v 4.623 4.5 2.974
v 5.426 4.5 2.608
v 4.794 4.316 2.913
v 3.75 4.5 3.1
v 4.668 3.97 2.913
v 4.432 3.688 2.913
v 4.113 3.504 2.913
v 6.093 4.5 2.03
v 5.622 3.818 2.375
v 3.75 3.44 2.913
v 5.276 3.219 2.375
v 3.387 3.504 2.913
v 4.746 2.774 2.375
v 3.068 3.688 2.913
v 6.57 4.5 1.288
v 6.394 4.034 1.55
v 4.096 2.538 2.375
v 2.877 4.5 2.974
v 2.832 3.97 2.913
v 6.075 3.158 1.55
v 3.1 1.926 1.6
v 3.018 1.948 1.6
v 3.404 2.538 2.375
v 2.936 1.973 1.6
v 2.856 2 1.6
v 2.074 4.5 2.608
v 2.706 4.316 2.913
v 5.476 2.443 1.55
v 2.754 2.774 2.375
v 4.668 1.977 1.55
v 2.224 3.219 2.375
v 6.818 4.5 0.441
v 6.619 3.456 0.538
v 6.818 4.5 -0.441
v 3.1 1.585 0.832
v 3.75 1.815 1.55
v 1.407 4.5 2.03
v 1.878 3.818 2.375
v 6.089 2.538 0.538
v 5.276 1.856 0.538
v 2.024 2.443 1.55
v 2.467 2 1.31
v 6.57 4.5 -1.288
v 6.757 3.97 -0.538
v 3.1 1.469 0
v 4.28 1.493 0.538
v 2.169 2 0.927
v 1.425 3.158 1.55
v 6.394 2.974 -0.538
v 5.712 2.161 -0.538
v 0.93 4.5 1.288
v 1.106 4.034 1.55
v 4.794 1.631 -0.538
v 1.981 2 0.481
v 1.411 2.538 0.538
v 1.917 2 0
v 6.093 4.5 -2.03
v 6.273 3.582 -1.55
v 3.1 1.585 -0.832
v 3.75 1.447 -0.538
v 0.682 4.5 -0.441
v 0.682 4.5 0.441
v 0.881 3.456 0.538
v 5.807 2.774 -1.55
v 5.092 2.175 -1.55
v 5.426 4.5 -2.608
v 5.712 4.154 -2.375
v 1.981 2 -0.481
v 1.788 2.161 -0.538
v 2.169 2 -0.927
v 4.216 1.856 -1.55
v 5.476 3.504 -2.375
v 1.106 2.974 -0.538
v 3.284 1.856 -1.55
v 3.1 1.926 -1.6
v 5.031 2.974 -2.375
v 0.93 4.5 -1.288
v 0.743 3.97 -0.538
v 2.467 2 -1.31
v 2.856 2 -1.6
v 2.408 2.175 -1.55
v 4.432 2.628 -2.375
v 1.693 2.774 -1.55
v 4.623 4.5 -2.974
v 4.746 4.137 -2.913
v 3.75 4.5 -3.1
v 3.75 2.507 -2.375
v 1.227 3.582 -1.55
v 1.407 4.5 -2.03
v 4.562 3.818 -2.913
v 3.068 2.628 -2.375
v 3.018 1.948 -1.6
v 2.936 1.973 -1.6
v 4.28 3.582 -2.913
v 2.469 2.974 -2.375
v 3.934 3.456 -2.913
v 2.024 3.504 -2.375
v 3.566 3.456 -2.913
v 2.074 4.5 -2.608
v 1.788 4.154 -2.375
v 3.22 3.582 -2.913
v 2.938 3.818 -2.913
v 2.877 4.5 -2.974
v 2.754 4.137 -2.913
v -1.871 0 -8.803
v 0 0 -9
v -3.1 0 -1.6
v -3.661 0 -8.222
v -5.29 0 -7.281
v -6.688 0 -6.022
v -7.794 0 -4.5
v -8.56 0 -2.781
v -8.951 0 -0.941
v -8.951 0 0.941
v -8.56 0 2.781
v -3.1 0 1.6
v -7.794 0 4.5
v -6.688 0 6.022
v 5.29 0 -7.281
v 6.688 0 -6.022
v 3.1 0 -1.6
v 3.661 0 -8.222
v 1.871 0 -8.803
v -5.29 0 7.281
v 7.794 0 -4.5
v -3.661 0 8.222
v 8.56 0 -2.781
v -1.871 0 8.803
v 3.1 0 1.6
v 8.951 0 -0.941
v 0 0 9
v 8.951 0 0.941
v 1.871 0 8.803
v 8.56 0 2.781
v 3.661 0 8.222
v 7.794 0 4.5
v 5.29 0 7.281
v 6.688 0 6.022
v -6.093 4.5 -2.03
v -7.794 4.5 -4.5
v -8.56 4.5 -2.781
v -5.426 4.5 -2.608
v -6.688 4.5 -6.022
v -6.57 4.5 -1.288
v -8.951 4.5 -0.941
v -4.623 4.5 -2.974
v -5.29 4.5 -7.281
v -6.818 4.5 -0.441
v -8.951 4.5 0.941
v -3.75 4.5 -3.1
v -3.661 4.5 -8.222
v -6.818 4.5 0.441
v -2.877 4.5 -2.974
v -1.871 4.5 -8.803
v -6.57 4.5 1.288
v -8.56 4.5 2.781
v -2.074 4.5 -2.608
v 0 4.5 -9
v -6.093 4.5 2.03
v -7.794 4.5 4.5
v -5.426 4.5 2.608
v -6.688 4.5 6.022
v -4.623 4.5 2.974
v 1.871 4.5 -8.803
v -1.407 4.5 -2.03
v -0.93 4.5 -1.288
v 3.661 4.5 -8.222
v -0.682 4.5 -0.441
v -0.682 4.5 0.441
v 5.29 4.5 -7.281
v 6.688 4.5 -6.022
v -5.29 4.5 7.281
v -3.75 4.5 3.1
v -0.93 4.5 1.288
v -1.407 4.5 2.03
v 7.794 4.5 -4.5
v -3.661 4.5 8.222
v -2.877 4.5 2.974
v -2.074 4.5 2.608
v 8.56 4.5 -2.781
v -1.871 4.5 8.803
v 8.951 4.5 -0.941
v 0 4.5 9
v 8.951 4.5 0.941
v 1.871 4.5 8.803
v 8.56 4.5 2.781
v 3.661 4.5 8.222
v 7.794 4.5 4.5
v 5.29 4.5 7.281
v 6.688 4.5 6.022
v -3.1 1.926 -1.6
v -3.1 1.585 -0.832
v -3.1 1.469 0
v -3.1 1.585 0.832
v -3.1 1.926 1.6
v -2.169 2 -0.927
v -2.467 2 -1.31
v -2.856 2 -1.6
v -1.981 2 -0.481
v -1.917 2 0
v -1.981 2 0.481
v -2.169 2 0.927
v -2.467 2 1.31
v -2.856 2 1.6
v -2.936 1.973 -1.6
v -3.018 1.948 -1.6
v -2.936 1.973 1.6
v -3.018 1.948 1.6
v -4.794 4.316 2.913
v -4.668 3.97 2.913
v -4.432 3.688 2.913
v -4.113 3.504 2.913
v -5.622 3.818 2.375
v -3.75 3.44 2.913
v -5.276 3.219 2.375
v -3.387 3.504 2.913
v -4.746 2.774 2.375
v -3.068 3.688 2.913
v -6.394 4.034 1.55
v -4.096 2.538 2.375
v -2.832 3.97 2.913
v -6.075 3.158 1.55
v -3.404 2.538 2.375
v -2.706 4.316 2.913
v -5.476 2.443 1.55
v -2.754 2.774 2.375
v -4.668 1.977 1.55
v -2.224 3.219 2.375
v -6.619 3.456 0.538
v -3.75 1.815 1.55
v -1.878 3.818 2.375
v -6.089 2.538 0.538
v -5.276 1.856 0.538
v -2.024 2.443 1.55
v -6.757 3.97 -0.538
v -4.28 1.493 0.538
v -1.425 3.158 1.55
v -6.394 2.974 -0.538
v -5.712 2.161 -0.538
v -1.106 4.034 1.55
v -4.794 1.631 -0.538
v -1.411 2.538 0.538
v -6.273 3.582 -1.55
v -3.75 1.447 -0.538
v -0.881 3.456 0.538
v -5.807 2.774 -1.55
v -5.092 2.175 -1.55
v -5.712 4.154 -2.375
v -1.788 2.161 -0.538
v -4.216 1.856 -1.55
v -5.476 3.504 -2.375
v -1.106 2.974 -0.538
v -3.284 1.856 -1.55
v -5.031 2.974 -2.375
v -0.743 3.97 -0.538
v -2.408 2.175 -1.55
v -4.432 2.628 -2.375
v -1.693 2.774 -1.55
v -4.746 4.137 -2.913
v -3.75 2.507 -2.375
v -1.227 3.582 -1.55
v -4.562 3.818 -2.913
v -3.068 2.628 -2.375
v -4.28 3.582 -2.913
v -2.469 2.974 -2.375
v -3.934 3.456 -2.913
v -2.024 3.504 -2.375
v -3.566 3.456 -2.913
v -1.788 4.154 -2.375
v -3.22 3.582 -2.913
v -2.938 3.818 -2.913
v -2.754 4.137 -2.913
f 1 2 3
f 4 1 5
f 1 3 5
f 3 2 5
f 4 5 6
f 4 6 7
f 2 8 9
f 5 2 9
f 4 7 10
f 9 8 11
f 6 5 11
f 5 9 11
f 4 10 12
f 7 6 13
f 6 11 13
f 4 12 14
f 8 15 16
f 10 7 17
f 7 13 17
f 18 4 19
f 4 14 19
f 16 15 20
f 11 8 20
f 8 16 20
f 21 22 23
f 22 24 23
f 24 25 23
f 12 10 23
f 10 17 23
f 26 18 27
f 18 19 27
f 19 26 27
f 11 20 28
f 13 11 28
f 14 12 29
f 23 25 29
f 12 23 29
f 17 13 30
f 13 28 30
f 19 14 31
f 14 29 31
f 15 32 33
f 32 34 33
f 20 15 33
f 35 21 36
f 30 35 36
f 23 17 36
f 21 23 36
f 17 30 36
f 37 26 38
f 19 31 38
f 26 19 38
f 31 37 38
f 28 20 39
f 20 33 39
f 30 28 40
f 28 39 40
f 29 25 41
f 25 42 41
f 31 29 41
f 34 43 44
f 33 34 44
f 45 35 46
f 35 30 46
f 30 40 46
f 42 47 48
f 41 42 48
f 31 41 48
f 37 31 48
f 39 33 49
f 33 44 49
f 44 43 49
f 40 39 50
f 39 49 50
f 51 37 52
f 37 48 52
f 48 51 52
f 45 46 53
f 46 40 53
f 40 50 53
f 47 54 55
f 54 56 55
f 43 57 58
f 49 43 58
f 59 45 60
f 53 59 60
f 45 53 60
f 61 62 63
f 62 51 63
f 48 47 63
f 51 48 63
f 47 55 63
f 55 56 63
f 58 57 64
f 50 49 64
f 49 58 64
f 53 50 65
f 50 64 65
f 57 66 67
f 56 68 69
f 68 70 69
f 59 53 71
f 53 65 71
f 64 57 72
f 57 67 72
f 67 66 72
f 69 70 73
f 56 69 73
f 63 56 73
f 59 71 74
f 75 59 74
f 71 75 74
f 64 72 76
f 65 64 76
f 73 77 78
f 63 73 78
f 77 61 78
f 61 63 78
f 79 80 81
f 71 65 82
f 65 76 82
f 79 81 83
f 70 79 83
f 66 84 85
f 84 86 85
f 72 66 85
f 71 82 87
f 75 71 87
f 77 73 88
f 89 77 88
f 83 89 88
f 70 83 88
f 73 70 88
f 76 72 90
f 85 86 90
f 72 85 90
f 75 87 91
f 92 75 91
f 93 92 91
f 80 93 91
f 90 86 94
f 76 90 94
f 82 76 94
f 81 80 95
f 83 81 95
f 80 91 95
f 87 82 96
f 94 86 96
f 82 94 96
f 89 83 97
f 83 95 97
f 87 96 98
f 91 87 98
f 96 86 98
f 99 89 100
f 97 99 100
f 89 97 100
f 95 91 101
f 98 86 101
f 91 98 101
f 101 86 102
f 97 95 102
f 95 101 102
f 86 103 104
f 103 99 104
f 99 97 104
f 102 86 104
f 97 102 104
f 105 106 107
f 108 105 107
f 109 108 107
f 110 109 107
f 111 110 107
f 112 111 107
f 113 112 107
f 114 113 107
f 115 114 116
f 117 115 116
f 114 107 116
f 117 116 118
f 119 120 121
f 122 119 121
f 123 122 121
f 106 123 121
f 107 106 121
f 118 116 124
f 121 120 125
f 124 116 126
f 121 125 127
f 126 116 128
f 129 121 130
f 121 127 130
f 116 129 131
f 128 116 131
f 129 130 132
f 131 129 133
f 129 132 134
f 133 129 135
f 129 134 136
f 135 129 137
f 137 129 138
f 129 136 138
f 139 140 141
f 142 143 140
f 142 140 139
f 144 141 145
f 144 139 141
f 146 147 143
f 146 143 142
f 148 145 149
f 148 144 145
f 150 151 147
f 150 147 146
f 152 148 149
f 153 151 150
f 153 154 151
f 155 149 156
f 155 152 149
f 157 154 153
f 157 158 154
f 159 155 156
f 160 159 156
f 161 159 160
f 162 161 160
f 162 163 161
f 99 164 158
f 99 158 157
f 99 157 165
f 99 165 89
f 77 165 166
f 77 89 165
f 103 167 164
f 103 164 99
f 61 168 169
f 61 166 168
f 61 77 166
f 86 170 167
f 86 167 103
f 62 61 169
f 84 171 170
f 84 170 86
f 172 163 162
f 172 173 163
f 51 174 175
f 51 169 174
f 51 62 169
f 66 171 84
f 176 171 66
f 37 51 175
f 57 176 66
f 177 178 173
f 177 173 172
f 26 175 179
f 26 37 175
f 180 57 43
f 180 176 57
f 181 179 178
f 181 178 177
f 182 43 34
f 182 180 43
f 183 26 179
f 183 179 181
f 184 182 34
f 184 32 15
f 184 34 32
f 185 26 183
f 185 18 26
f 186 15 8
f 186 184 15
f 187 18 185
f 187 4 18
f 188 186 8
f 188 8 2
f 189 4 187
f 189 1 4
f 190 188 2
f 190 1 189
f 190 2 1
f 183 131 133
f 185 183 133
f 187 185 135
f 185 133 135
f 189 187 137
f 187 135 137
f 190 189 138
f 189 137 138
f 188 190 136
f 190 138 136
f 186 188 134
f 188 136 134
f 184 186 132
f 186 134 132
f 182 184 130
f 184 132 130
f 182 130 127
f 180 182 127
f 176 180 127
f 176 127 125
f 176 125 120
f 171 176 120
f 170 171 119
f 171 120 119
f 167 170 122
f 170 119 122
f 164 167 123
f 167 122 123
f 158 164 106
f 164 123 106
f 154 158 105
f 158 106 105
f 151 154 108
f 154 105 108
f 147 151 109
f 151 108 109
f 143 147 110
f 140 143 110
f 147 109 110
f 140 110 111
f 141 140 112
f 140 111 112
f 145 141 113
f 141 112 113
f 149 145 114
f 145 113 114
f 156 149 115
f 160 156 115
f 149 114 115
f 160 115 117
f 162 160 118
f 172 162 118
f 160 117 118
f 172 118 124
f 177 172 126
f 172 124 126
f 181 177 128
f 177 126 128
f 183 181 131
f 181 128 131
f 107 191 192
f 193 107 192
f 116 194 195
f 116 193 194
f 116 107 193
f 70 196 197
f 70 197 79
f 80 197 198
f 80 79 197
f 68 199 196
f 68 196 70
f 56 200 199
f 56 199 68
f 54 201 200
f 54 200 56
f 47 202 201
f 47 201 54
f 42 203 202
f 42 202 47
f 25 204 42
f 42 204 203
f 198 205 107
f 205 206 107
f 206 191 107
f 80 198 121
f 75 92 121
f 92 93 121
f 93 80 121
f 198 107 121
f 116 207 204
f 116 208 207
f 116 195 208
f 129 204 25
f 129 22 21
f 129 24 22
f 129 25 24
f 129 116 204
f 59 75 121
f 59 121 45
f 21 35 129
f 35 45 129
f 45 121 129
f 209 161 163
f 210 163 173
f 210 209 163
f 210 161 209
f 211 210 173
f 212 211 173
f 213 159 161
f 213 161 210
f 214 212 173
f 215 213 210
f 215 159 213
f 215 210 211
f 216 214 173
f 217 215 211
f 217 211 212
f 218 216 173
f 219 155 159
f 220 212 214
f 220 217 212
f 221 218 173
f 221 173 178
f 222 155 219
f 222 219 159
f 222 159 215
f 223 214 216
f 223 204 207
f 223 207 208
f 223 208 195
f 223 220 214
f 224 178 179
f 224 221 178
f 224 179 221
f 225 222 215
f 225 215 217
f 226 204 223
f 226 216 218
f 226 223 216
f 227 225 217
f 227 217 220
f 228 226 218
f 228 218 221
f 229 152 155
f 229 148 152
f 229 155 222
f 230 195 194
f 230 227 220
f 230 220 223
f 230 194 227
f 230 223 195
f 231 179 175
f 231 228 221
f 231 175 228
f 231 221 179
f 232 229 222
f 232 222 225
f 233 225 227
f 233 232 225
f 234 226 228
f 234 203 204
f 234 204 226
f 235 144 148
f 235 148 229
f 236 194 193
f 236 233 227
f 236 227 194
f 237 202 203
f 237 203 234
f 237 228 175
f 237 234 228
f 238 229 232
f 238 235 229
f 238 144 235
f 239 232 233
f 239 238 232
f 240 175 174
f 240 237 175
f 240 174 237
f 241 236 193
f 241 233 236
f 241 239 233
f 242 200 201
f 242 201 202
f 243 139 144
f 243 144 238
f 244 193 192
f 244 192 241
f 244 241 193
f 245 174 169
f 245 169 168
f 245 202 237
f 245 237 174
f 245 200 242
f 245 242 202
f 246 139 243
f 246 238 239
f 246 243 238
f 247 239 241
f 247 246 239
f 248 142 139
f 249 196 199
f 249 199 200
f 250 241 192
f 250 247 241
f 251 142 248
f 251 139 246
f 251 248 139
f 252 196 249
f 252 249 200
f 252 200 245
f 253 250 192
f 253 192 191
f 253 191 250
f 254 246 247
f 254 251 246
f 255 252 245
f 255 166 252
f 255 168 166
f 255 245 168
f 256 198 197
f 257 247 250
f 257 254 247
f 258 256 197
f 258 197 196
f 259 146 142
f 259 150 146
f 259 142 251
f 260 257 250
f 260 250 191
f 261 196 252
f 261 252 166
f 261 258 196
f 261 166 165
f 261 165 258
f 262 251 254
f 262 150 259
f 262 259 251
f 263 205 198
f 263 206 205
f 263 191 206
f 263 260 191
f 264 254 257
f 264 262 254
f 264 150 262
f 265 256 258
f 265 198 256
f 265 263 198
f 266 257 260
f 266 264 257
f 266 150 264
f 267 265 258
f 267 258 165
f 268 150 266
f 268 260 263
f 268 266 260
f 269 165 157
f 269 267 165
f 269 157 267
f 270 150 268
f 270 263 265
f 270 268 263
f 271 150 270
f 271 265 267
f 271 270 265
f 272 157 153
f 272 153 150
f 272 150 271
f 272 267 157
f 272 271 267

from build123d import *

# Parameters (mm, degrees)
SKETCH2_R           = 9
BOSS_EXTRUDE1_DEPTH = 4.5
SKETCH3_W           = 6.2
SKETCH3_H           = 3.2
CUT_EXTRUDE1_DEPTH  = 2


with BuildPart() as part:
    # Sketch2 → Boss-Extrude1 (new body)
    with BuildSketch(Plane(origin=(0, 0, 0), x_dir=(1, 0, 0), z_dir=(0, 1, 0))):
        Circle(SKETCH2_R)
    extrude(amount=BOSS_EXTRUDE1_DEPTH)

    # Sketch3 → Cut-Extrude1 (cut)
    with BuildSketch(Plane.XZ):
        Rectangle(SKETCH3_W, SKETCH3_H)
    extrude(amount=-CUT_EXTRUDE1_DEPTH, mode=Mode.SUBTRACT)

    # Sketch4 → Cut-Revolve1 (revolve, cut)
    with BuildSketch(Plane(origin=(0, 4.5, 0), x_dir=(1, 0, 0), z_dir=(0, 1, 0))):
        with BuildLine():
            Line((-3.75, 3.1), (-3.75, -3.1))
            ThreePointArc((-3.75, -3.1), (-6.85, 0), (-3.75, 3.1))
        make_face()
    cut_revolve1 = revolve(axis=Axis((-3.75, 4.5, -3.1), (0, 0, 1)), mode=Mode.SUBTRACT)

    # Mirror1: Cut-Revolve1 across plane
    add(cut_revolve1.mirror(Plane(origin=(0, 0, 0), x_dir=(0, 0, 1), z_dir=(1, 0, 0))), mode=Mode.SUBTRACT)


solid = part.part
